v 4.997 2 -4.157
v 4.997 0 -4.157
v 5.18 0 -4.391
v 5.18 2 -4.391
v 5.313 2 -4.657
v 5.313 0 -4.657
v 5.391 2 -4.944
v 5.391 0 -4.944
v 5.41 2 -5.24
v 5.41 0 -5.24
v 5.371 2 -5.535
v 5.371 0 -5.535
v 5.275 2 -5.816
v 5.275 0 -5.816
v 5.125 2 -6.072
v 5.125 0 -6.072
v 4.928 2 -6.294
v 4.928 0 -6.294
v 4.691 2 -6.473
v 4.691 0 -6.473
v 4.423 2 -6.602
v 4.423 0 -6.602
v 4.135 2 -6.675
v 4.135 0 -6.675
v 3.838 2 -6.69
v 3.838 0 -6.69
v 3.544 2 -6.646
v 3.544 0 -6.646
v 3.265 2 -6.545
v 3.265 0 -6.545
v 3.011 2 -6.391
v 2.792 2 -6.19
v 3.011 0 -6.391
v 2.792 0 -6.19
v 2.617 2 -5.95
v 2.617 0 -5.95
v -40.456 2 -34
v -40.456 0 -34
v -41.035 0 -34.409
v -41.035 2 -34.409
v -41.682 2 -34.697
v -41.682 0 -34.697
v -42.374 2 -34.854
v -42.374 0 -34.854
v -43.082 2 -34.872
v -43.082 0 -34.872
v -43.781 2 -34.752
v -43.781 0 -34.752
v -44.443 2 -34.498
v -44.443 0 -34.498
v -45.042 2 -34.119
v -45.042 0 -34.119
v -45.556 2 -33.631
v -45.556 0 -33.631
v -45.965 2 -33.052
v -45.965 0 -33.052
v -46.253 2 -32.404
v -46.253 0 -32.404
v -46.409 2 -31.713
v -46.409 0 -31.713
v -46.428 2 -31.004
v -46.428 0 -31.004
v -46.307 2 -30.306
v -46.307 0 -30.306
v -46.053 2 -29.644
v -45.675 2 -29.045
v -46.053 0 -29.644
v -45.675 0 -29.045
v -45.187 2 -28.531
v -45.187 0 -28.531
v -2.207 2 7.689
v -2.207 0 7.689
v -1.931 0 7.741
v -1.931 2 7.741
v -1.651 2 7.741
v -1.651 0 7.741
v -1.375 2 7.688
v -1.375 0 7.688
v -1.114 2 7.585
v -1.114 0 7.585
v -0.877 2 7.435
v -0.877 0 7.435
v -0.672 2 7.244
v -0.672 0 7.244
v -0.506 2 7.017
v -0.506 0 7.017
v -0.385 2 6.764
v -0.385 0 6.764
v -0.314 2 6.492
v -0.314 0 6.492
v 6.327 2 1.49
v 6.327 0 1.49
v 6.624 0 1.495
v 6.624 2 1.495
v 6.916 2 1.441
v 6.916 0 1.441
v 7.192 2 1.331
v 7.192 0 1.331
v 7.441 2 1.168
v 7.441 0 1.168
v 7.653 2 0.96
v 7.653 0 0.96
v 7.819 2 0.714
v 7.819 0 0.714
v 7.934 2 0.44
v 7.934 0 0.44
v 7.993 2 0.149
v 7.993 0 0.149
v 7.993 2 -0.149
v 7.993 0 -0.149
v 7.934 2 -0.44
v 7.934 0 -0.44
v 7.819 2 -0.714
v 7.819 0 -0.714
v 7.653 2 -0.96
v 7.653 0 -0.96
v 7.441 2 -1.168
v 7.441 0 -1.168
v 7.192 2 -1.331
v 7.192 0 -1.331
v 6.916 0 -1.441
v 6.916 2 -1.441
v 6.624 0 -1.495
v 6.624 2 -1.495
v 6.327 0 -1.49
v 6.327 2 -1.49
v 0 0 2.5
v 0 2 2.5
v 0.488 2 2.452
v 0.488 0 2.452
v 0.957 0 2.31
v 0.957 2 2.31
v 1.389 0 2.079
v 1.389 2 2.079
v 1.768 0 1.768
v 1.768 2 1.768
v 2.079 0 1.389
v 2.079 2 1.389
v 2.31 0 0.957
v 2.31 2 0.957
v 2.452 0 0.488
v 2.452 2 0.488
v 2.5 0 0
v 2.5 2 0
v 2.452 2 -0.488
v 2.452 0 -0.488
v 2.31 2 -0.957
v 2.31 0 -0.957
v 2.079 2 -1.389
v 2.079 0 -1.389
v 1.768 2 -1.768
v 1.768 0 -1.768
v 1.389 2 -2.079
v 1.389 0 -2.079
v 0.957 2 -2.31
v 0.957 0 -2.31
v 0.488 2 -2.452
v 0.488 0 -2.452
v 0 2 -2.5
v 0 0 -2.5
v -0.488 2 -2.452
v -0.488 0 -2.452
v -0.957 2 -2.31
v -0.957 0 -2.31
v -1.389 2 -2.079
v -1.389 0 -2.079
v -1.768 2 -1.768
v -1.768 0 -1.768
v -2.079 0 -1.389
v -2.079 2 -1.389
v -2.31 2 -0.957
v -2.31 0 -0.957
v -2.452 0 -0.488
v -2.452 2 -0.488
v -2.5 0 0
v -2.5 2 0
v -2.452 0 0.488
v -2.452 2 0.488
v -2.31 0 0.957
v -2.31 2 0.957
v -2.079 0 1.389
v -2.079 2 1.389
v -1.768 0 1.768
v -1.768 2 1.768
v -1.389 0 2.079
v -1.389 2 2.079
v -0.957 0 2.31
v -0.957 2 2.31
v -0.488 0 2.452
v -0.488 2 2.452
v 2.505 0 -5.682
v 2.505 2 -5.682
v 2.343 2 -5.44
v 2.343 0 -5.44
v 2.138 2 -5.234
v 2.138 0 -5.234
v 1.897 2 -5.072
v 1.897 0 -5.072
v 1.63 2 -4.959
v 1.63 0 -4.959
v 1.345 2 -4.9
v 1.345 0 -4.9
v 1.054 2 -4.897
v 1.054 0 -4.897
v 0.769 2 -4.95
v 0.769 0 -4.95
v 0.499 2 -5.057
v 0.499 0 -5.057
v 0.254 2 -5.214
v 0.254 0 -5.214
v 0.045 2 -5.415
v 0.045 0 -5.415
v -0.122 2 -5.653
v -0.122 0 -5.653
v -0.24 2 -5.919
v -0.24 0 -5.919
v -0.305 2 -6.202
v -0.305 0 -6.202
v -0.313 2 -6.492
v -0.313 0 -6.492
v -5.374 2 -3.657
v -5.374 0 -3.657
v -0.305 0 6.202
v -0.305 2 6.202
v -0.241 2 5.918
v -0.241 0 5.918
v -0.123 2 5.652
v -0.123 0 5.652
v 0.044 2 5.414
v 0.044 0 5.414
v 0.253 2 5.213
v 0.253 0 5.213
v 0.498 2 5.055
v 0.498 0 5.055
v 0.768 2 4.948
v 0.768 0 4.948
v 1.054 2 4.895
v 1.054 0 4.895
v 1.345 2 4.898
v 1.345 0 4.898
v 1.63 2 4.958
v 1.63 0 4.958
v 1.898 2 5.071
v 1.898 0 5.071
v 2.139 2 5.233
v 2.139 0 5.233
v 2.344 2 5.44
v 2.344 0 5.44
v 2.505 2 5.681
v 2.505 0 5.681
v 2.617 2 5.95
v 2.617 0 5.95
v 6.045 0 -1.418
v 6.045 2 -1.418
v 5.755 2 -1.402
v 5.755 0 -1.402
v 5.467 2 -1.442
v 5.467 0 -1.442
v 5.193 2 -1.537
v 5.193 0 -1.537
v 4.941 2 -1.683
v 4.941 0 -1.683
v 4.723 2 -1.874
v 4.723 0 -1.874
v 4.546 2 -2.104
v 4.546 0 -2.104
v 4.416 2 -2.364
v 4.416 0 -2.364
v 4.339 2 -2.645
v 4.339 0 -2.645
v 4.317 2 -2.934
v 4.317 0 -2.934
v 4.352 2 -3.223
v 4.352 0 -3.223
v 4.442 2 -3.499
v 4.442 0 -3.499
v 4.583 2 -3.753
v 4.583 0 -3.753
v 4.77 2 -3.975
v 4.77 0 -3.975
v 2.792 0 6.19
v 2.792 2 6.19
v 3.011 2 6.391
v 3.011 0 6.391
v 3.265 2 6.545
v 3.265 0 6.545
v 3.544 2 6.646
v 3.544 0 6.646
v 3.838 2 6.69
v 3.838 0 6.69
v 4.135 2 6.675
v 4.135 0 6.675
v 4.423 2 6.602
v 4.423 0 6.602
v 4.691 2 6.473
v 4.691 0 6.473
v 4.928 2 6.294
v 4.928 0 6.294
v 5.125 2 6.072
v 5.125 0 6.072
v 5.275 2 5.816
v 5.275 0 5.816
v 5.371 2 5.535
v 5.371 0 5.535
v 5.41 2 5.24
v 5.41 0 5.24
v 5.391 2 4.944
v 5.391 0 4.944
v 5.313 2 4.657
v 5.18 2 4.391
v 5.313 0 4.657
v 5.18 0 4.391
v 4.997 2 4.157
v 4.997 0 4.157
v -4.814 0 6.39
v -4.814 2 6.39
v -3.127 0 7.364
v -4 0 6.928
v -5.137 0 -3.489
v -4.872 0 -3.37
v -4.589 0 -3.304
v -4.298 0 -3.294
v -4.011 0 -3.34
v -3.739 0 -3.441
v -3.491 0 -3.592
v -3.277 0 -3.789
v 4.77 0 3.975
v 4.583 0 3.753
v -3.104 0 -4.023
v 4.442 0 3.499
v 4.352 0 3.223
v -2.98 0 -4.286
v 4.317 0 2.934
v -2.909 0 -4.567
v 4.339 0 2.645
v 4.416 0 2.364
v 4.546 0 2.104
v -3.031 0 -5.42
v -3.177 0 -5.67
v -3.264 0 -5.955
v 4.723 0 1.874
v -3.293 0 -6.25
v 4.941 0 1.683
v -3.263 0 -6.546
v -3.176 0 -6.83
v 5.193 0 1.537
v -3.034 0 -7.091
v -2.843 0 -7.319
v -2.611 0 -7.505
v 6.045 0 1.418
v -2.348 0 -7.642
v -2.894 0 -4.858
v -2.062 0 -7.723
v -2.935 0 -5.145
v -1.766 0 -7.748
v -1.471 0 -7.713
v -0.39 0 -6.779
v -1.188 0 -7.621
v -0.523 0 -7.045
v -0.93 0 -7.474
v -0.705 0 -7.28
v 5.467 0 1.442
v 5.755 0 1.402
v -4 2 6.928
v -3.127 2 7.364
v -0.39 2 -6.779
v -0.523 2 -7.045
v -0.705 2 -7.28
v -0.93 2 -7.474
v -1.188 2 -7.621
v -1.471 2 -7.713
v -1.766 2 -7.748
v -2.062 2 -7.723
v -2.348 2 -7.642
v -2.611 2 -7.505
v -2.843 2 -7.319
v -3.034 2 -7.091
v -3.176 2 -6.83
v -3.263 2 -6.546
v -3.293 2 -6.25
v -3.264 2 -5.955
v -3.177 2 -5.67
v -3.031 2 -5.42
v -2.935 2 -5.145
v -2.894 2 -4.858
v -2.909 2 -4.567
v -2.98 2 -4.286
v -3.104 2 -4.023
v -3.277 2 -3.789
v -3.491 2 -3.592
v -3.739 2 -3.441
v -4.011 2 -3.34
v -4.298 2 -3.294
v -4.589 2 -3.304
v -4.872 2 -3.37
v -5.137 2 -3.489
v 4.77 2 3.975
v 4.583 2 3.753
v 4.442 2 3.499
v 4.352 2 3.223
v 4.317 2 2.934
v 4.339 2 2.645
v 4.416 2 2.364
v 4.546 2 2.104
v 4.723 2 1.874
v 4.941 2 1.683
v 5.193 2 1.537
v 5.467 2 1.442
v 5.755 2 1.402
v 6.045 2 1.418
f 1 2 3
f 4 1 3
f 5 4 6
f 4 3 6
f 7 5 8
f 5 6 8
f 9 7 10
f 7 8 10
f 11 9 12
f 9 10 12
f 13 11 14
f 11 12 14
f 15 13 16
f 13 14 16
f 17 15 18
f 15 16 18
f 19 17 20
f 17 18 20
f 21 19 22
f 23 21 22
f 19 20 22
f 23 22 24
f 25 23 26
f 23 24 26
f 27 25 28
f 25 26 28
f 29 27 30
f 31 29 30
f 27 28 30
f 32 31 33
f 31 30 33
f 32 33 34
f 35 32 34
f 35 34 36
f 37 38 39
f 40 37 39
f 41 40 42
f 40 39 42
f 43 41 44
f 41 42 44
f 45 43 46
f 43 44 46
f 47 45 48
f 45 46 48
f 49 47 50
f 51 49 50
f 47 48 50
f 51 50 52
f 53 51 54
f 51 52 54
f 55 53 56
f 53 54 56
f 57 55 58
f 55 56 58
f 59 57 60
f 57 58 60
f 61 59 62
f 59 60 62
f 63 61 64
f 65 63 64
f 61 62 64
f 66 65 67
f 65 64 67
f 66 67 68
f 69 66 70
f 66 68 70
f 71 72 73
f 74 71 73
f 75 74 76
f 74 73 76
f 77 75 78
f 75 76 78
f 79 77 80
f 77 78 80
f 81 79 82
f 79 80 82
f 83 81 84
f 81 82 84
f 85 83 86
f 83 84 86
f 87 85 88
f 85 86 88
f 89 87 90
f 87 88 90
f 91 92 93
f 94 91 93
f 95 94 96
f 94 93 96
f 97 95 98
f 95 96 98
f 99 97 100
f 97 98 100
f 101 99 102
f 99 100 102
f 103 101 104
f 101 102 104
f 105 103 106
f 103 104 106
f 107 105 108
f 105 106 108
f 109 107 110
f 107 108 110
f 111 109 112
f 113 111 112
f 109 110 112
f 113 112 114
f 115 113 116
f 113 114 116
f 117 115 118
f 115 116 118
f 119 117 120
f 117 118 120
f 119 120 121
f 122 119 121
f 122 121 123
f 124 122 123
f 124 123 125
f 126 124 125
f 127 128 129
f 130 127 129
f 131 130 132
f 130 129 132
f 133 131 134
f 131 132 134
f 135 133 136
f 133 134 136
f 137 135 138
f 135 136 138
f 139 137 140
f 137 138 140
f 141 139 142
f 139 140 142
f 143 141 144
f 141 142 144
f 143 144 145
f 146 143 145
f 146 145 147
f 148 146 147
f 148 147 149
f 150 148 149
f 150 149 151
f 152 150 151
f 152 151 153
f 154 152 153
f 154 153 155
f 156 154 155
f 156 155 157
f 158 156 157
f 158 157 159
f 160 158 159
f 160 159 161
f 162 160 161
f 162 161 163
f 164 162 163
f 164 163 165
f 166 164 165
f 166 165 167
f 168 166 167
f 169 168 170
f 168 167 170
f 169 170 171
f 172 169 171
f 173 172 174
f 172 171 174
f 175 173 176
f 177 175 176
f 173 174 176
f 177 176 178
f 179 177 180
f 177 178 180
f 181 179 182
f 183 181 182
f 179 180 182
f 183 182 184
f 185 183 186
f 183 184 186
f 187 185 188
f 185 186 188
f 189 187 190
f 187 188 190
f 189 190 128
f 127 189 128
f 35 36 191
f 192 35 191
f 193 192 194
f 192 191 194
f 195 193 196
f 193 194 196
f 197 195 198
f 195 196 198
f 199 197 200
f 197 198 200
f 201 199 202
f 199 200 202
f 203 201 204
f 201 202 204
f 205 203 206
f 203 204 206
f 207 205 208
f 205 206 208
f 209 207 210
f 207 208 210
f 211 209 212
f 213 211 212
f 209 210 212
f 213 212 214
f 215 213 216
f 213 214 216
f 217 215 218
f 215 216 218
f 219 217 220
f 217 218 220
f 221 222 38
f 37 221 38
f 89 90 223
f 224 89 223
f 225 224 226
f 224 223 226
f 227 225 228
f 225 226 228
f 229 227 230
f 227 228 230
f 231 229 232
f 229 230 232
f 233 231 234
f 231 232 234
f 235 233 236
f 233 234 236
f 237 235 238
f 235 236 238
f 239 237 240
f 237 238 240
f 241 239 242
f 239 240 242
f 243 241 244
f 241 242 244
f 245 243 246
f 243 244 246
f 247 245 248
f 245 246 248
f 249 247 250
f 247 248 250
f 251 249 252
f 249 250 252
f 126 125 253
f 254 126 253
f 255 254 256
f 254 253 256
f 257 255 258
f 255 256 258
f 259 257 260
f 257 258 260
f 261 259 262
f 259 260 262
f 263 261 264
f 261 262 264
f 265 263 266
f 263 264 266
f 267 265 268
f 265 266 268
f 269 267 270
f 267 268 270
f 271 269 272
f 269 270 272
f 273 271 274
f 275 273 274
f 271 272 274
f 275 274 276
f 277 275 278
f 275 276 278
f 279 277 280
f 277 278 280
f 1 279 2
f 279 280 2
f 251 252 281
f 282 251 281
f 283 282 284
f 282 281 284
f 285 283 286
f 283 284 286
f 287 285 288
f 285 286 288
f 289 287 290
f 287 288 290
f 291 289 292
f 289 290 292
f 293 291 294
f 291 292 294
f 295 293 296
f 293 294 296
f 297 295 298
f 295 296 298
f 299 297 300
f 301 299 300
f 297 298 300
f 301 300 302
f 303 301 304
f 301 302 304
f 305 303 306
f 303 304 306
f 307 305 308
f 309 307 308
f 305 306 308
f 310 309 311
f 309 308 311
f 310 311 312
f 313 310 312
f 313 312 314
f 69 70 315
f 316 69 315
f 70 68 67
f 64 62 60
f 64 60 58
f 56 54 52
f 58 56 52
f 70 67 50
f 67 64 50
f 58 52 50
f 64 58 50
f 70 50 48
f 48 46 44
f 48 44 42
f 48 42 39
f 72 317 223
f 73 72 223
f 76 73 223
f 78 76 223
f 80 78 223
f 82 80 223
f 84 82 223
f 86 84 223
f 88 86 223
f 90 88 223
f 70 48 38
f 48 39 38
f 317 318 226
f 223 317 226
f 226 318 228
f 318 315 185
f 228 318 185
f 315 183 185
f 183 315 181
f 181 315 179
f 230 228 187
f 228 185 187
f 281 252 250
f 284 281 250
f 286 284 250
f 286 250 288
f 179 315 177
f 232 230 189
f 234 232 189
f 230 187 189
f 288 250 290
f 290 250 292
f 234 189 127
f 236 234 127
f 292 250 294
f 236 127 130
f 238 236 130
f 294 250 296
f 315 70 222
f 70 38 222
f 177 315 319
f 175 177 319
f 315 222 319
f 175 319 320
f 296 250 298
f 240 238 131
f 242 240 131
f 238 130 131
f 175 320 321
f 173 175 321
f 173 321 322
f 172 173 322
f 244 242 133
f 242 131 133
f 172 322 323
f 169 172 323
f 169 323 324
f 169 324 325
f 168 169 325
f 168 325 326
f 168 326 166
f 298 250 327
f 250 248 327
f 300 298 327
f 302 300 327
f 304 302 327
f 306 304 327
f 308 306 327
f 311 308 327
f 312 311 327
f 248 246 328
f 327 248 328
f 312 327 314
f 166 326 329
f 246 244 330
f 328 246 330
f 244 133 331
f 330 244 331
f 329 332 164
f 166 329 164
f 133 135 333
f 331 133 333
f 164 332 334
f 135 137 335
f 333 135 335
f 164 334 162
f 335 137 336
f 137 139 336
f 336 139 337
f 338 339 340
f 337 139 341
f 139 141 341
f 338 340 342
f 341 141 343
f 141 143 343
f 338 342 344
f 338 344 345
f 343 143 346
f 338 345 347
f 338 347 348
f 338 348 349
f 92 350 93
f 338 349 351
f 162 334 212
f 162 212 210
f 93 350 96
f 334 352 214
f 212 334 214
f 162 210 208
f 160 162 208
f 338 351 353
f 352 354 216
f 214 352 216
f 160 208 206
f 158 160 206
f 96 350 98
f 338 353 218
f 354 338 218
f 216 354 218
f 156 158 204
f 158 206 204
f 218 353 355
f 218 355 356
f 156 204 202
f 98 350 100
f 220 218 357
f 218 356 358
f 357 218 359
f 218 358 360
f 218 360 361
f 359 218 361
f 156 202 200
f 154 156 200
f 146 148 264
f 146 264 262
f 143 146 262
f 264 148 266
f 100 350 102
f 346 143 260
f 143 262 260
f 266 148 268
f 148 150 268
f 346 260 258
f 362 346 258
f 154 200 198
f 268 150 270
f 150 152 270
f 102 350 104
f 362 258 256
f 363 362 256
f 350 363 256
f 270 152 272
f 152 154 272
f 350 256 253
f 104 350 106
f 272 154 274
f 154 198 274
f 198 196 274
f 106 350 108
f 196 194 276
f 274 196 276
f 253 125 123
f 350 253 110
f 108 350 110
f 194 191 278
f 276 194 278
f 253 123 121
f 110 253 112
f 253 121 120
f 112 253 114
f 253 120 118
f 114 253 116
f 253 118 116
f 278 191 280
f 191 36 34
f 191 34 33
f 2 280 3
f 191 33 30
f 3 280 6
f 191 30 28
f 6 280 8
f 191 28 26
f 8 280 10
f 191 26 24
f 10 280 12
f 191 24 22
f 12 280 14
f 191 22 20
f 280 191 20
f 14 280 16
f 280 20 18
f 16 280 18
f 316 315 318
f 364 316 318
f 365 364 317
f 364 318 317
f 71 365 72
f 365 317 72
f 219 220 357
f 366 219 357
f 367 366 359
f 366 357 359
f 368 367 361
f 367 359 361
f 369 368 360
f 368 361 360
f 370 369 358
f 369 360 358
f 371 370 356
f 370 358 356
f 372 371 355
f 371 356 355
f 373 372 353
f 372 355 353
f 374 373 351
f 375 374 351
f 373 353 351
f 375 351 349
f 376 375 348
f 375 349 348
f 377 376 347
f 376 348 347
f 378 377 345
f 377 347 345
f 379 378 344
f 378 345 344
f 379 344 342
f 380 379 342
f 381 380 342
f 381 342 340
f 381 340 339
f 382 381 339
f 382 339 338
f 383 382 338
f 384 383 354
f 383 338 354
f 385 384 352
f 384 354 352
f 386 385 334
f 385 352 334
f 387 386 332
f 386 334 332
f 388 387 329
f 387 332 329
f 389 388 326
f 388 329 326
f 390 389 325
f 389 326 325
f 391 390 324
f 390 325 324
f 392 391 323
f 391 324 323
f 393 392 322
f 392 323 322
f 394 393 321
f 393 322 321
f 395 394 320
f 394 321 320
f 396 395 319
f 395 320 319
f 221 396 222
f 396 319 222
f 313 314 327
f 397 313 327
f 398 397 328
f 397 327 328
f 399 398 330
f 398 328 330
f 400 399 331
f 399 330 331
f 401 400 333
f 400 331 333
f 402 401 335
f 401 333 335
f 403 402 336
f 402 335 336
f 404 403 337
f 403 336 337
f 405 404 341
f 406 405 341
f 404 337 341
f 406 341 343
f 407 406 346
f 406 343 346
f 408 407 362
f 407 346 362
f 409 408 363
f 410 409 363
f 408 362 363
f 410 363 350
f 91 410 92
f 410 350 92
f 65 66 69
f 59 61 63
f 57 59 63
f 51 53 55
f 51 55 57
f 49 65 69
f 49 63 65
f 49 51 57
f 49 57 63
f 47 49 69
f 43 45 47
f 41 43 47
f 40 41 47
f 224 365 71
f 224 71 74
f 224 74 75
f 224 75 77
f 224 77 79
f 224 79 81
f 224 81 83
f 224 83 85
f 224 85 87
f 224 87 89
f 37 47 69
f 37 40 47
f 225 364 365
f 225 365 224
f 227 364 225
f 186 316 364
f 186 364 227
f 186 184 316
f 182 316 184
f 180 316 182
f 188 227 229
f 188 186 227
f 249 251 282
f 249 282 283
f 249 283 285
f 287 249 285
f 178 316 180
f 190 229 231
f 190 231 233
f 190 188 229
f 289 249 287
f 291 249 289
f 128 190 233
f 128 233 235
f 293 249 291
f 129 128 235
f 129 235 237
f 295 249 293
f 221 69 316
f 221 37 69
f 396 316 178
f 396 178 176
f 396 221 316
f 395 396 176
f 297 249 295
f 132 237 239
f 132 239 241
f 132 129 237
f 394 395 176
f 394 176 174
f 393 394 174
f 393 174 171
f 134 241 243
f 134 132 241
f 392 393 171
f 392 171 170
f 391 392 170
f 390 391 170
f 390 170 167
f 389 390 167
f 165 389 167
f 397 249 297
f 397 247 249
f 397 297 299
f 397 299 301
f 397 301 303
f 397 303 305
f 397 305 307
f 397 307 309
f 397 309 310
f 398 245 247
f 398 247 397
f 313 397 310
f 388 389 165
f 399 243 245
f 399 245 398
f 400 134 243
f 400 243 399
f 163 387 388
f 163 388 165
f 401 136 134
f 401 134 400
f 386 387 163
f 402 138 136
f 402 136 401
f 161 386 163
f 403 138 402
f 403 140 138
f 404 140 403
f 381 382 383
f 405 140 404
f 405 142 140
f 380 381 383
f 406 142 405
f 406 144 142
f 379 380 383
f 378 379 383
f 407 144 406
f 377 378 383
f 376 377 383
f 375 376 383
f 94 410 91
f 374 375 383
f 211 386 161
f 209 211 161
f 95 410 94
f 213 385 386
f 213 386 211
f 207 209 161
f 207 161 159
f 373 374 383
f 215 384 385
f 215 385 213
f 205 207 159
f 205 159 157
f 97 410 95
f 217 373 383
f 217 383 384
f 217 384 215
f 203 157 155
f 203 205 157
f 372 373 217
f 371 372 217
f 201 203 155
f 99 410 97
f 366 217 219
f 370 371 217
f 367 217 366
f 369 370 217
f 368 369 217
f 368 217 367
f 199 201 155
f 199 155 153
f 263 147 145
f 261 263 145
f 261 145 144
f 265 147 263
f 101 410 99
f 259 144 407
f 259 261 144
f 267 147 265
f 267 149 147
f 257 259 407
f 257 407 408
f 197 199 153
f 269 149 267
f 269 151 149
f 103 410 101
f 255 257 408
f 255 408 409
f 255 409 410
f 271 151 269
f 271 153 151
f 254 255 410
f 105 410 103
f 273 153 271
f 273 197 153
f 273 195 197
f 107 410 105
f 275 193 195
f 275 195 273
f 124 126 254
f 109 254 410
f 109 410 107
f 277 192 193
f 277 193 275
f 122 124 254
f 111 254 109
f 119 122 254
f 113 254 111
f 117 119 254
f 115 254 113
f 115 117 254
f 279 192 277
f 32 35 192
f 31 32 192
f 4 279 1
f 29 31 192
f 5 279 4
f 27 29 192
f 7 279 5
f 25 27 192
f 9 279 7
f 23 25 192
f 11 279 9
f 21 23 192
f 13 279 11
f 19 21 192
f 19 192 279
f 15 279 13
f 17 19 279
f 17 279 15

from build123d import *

# Parameters (mm, degrees)
EXTRUDE_1_DEPTH     = 2
SKETCH_2_R          = 2.5
CUT_EXTRUDE_1_DEPTH = 59.113082246


with BuildPart() as part:
    # Эскиз1 → Бобышка-Вытянуть1 (new body)
    with BuildSketch(Plane(origin=(0, 0, 0), x_dir=(1, 0, 0), z_dir=(0, 1, 0))):
        with BuildLine():
            Line((-5.373970273, 3.656561705), (-40.455802455, 34.00041309))
            ThreePointArc((-40.455802455, 34.00041309), (-45.556108034, 33.631060436), (-45.18675538, 28.530754857))
            Line((-45.18675538, 28.530754857), (-4.813797954, -6.389628256))
            ThreePointArc((-4.813797954, -6.389628256), (-3.570215935, -7.159159041), (-2.207328799, -7.689453789))
            ThreePointArc((-2.207328799, -7.689453789), (-0.992008234, -7.515625856), (-0.313557112, -6.492432667))
            ThreePointArc((-0.313557112, -6.492432667), (0.909859751, -4.914690841), (2.617012816, -5.949894446))
            ThreePointArc((2.617012816, -5.949894446), (4.813797954, -6.389628256), (4.997119526, -4.156777171))
            ThreePointArc((4.997119526, -4.156777171), (4.474545709, -2.231241963), (6.326923077, -1.489981335))
            ThreePointArc((6.326923077, -1.489981335), (8, 0), (6.326923077, 1.489981335))
            ThreePointArc((6.326923077, 1.489981335), (4.474545709, 2.231241963), (4.997119526, 4.156777171))
            ThreePointArc((4.997119526, 4.156777171), (4.813797954, 6.389628256), (2.617012816, 5.949894446))
            ThreePointArc((2.617012816, 5.949894446), (0.910344036, 4.916428962), (-0.31314214, 6.492452695))
            ThreePointArc((-0.31314214, 6.492452695), (-2.206837314, 7.689594857), (-3.177480342, 5.670416094))
            ThreePointArc((-3.177480342, 5.670416094), (-3.378992644, 3.685431957), (-5.373970273, 3.656561705))
        make_face()
    extrude(amount=EXTRUDE_1_DEPTH)

    # Эскиз2 → Вырез-Вытянуть1 (cut, through all)
    with BuildSketch(Plane(origin=(0, 2, 0), x_dir=(1, 0, 0), z_dir=(0, 1, 0))):
        with Locations(Location((0, 0, 0), (0, 0, 270))):
            Circle(SKETCH_2_R)
    extrude(amount=-CUT_EXTRUDE_1_DEPTH, mode=Mode.SUBTRACT)


solid = part.part
